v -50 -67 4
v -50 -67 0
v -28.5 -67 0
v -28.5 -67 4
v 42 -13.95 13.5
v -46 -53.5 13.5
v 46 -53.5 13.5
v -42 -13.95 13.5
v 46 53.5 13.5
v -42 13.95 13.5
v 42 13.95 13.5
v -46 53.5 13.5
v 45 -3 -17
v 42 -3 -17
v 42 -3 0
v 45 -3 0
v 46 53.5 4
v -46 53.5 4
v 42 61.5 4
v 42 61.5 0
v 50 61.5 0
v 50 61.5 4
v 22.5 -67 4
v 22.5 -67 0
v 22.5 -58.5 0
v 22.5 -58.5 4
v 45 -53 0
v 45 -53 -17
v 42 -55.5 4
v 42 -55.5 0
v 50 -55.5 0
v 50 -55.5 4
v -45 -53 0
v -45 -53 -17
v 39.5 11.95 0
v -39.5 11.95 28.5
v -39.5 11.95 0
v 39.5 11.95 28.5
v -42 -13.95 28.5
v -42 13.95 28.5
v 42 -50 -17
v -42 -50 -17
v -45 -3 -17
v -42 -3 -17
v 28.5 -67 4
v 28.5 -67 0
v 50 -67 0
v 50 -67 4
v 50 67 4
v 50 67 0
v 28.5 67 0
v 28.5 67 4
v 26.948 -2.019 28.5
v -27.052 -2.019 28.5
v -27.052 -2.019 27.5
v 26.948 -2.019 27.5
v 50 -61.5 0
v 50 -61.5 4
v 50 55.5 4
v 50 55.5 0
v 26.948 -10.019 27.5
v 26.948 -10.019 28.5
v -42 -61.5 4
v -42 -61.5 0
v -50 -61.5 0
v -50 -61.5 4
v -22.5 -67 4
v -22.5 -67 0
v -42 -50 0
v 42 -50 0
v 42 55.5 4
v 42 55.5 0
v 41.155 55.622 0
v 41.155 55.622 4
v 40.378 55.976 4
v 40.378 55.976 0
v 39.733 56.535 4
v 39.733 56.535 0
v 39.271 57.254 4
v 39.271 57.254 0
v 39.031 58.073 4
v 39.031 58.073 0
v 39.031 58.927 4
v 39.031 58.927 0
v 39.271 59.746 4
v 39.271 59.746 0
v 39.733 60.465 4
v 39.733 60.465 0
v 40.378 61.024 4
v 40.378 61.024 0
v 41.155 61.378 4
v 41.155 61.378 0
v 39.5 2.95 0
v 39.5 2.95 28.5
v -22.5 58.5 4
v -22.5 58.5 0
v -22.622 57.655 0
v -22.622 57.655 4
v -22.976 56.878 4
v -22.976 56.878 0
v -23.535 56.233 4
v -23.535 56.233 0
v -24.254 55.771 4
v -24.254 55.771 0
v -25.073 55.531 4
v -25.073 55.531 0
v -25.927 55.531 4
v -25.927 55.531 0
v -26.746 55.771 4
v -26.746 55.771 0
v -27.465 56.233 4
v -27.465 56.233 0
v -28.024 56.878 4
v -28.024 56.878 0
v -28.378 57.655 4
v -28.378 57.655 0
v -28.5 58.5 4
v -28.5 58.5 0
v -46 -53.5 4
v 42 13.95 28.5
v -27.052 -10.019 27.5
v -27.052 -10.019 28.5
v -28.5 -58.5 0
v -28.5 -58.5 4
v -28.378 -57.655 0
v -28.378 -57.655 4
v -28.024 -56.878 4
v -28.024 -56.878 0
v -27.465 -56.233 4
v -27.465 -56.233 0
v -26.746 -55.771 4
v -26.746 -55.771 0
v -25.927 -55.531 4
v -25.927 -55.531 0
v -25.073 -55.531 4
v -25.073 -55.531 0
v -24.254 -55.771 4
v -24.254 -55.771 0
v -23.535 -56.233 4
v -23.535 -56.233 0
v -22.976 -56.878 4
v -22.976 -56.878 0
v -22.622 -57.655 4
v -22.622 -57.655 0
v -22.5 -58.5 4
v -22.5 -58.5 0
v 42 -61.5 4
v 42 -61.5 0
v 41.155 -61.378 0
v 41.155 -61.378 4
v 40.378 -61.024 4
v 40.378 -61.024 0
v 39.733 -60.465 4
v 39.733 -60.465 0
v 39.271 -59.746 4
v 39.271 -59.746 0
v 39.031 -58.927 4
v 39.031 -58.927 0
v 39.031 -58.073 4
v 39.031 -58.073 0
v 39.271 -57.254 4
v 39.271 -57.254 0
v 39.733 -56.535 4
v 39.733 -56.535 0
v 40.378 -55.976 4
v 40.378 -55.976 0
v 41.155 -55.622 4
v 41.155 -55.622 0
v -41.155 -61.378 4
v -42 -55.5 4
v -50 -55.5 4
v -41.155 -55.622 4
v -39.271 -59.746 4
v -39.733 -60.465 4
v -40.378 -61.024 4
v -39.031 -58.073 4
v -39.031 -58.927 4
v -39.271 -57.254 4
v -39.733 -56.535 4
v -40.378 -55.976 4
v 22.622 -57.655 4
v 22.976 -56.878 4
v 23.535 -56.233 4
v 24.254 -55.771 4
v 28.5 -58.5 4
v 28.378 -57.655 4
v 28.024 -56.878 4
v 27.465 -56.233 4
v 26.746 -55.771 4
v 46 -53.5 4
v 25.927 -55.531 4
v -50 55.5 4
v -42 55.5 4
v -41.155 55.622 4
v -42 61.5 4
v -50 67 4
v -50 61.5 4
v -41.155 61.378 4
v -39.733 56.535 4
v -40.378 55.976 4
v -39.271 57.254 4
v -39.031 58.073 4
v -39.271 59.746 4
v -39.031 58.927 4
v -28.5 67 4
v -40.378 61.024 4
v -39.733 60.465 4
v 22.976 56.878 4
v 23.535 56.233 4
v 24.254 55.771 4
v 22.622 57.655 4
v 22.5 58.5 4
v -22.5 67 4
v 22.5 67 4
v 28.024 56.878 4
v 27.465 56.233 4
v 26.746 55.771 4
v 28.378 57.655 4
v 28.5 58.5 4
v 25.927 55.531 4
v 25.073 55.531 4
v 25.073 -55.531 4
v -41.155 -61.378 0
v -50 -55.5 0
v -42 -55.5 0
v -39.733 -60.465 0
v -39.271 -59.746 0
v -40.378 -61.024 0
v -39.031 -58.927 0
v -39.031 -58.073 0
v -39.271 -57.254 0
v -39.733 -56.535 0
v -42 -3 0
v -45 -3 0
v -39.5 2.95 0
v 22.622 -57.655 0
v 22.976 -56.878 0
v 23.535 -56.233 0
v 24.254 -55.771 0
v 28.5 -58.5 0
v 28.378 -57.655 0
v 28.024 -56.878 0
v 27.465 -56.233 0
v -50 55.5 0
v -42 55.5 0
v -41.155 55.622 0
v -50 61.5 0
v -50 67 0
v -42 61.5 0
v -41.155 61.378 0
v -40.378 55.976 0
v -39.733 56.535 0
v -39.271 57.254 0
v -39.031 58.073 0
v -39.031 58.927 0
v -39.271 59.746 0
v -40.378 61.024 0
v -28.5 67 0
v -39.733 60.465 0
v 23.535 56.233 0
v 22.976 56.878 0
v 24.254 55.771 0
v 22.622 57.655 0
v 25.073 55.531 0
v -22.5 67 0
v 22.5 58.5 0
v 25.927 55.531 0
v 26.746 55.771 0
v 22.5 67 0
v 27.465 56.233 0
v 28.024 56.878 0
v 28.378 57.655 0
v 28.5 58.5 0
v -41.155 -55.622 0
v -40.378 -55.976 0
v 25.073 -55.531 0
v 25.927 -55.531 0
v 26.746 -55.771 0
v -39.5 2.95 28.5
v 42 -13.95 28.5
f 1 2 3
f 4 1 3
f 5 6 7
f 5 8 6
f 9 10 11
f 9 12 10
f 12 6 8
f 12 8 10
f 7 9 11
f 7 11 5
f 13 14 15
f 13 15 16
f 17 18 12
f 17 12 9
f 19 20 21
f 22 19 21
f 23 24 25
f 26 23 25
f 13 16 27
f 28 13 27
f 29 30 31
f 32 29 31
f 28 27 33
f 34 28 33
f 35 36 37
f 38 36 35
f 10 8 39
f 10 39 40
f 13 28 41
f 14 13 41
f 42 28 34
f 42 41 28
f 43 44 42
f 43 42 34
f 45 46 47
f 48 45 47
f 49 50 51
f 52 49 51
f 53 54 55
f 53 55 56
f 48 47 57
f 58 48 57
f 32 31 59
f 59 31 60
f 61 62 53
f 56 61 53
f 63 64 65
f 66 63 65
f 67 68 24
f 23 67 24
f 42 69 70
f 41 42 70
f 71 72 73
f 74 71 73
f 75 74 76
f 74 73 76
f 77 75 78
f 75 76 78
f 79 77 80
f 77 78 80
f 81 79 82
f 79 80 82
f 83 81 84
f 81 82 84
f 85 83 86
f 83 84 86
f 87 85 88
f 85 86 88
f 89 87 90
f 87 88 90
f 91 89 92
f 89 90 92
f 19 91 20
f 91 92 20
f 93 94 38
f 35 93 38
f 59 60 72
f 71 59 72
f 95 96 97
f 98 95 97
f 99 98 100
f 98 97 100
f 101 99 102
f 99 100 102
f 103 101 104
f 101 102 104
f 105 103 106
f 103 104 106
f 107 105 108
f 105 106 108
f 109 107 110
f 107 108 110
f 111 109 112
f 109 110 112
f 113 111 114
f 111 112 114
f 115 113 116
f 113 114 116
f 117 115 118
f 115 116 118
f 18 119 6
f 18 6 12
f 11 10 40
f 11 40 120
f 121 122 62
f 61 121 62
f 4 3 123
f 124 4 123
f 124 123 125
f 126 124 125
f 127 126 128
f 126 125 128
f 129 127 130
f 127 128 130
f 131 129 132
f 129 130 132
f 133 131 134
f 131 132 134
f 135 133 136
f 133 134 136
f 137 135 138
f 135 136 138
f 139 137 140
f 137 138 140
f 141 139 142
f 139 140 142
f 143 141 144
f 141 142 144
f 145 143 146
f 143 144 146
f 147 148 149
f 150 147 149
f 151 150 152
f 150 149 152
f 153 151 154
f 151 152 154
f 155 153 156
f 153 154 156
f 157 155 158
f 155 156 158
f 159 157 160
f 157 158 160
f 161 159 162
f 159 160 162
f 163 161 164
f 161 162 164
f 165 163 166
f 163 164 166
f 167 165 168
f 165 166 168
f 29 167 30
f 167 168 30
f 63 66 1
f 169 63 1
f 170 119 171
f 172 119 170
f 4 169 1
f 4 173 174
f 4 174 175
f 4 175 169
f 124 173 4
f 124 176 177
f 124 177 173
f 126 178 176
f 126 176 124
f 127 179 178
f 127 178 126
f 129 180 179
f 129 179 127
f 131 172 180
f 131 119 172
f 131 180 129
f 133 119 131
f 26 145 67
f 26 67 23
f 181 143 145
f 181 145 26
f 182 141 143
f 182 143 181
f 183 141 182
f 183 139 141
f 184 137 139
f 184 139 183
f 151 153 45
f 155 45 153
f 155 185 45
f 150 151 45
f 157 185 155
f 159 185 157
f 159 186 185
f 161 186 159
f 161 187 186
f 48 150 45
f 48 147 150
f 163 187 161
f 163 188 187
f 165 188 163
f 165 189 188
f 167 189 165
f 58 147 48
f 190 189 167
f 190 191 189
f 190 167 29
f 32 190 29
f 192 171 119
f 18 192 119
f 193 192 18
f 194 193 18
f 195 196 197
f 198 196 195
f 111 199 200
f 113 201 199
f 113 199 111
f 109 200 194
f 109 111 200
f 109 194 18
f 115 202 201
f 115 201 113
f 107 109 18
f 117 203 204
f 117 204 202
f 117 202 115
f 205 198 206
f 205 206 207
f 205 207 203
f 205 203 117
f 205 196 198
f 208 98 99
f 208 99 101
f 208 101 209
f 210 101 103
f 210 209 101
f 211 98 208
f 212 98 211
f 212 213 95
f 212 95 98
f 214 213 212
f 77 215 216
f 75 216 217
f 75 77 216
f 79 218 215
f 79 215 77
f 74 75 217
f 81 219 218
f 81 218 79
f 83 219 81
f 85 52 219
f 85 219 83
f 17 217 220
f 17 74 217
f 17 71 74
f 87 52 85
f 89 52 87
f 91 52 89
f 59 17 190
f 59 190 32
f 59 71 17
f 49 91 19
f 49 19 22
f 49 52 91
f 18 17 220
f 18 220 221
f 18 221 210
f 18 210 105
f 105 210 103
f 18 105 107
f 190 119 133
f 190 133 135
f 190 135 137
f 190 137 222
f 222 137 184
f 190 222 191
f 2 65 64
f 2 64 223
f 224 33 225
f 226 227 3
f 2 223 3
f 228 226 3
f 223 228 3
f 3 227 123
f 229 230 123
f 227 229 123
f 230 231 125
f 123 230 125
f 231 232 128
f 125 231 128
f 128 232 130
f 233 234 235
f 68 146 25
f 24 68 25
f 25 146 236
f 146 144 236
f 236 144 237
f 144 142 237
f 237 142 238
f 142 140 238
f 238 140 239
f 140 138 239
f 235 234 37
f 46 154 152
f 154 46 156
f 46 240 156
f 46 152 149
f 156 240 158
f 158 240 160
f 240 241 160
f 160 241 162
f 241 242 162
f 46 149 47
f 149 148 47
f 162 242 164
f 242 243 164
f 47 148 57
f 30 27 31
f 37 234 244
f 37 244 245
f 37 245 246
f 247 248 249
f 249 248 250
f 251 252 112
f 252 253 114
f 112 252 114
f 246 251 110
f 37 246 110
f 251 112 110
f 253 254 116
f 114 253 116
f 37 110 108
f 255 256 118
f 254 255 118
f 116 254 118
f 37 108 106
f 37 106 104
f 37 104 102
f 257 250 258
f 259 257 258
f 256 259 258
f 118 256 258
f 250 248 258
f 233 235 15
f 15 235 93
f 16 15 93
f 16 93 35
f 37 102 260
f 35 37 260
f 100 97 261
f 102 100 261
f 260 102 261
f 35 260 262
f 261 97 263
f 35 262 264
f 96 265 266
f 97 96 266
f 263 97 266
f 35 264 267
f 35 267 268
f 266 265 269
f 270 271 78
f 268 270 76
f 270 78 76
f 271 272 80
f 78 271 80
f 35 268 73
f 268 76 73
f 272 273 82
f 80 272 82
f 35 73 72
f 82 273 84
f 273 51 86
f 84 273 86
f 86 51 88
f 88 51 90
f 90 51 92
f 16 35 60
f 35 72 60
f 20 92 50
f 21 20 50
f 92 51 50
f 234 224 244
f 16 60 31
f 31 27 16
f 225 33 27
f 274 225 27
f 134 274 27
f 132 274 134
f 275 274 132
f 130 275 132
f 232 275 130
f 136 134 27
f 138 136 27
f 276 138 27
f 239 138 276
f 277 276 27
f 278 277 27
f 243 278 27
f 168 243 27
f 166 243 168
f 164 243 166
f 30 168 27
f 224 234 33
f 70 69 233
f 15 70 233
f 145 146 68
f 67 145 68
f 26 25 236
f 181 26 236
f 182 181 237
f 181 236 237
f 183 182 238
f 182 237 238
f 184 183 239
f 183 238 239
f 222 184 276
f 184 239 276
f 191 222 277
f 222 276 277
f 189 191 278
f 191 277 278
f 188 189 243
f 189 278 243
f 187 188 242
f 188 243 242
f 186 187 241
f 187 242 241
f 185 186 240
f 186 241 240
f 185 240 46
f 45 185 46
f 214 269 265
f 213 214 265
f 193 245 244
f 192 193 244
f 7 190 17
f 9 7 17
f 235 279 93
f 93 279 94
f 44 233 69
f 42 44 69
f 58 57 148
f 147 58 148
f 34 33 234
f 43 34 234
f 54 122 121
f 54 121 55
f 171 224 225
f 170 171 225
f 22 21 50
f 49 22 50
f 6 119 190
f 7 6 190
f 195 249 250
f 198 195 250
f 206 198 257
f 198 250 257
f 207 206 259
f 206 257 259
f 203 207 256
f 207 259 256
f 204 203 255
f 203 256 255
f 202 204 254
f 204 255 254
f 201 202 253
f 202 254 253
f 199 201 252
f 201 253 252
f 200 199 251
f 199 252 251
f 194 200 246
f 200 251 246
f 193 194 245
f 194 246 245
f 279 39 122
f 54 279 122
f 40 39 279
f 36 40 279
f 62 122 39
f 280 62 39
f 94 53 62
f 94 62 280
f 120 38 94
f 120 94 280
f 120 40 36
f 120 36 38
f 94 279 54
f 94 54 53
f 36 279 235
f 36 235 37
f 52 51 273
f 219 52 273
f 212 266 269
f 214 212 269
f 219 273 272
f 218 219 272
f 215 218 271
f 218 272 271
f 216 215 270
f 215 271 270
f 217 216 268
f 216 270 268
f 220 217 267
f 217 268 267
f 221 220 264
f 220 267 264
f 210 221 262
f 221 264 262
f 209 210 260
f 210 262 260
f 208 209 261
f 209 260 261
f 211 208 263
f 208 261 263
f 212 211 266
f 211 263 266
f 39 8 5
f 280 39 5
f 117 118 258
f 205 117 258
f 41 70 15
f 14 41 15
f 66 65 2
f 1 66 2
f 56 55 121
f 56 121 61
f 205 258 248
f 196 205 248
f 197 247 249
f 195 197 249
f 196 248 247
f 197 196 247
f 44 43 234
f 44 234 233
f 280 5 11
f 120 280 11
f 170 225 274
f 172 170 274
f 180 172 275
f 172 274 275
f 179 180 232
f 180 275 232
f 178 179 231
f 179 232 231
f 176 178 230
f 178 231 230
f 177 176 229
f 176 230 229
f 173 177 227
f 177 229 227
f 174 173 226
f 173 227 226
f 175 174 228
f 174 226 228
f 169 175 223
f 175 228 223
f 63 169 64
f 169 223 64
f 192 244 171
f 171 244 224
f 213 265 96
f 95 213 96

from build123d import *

# Parameters (mm, degrees)
BOSS_EXTRUDE1_DEPTH = 4
SKETCH2_W           = 92
SKETCH2_H           = 107
BOSS_EXTRUDE2_DEPTH = 13.5
SKETCH3_W           = 84
SKETCH3_H           = 27.9
BOSS_EXTRUDE3_DEPTH = 15
SKETCH4_W           = 79
SKETCH4_H           = 9
CUT_EXTRUDE1_DEPTH  = 89.324685111
SKETCH5_W           = 54
SKETCH5_H           = 8
CUT_EXTRUDE2_DEPTH  = 1
BOSS_EXTRUDE4_DEPTH = 17


with BuildPart() as part:
    # Sketch1 → Boss-Extrude1 (new body)
    with BuildSketch(Plane.XY):
        with BuildLine():
            Line((22.5, 58.5), (22.5, 67))
            Line((22.5, 67), (-22.5, 67))
            Line((-22.5, 67), (-22.5, 58.5))
            ThreePointArc((-22.5, 58.5), (-25.5, 55.5), (-28.5, 58.5))
            Line((-28.5, 58.5), (-28.5, 67))
            Line((-28.5, 67), (-50, 67))
            Line((-50, 67), (-50, 61.5))
            Line((-50, 61.5), (-42, 61.5))
            ThreePointArc((-42, 61.5), (-39, 58.5), (-42, 55.5))
            Line((-42, 55.5), (-50, 55.5))
            Line((-50, 55.5), (-50, -55.5))
            Line((-50, -55.5), (-42, -55.5))
            ThreePointArc((-42, -55.5), (-39, -58.5), (-42, -61.5))
            Line((-42, -61.5), (-50, -61.5))
            Line((-50, -61.5), (-50, -67))
            Line((-50, -67), (-28.5, -67))
            Line((-28.5, -67), (-28.5, -58.5))
            ThreePointArc((-28.5, -58.5), (-25.5, -55.5), (-22.5, -58.5))
            Line((-22.5, -58.5), (-22.5, -67))
            Line((-22.5, -67), (22.5, -67))
            Line((22.5, -67), (22.5, -58.5))
            ThreePointArc((22.5, -58.5), (25.5, -55.5), (28.5, -58.5))
            Line((28.5, -58.5), (28.5, -67))
            Line((28.5, -67), (50, -67))
            Line((50, -67), (50, -61.5))
            Line((50, -61.5), (42, -61.5))
            ThreePointArc((42, -61.5), (39, -58.5), (42, -55.5))
            Line((42, -55.5), (50, -55.5))
            Line((50, -55.5), (50, 55.5))
            Line((50, 55.5), (42, 55.5))
            ThreePointArc((42, 55.5), (39, 58.5), (42, 61.5))
            Line((42, 61.5), (50, 61.5))
            Line((50, 61.5), (50, 67))
            Line((50, 67), (28.5, 67))
            Line((28.5, 67), (28.5, 58.5))
            ThreePointArc((28.5, 58.5), (25.5, 55.5), (22.5, 58.5))
        make_face()
    extrude(amount=BOSS_EXTRUDE1_DEPTH)

    # Sketch2 → Boss-Extrude2 (add)
    with BuildSketch(Plane.XY):
        Rectangle(SKETCH2_W, SKETCH2_H)
    extrude(amount=BOSS_EXTRUDE2_DEPTH)

    # Sketch3 → Boss-Extrude3 (add)
    with BuildSketch(Plane.XY.offset(13.5)):
        Rectangle(SKETCH3_W, SKETCH3_H)
    extrude(amount=BOSS_EXTRUDE3_DEPTH)

    # Sketch4 → Cut-Extrude1 (cut, through all)
    with BuildSketch(Plane.XY.offset(28.5)):
        with Locations((0, 7.45)):
            Rectangle(SKETCH4_W, SKETCH4_H)
    extrude(amount=-CUT_EXTRUDE1_DEPTH, mode=Mode.SUBTRACT)

    # Sketch5 → Cut-Extrude2 (cut)
    with BuildSketch(Plane.XY.offset(28.5)):
        with Locations((-0.051701633, -6.019148753)):
            Rectangle(SKETCH5_W, SKETCH5_H)
    extrude(amount=-CUT_EXTRUDE2_DEPTH, mode=Mode.SUBTRACT)

    # Sketch6 → Boss-Extrude4 (add)
    with BuildSketch(Plane(origin=(0, 0, 0), x_dir=(-1, 0, 0), z_dir=(0, 0, -1))):
        Polygon((-45, -53), (45, -53), (45, -3), (42, -3), (42, -50), (-42, -50), (-42, -3), (-45, -3), align=None)
    extrude(amount=BOSS_EXTRUDE4_DEPTH)


solid = part.part
